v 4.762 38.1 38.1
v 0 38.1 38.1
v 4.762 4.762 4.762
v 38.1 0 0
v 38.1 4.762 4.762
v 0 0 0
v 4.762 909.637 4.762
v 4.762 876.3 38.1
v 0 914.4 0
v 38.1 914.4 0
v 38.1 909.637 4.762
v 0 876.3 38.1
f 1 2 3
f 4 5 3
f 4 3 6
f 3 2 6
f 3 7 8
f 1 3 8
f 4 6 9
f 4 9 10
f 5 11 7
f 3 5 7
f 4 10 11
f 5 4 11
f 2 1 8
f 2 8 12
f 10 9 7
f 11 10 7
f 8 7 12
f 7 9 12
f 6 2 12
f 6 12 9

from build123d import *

# Parameters (mm, degrees)
F1_DEPTH = 914.4
F3_DEPTH = 38.101


with BuildPart() as f1:
    # F0 (on Front) → F1 (new body)
    with BuildSketch(Plane.XZ):
        Polygon((0, 38.1), (0, 0), (38.1, 0), (38.1, 4.7625), (4.7625, 4.7625), (4.7625, 38.1), align=None)
    extrude(amount=-F1_DEPTH)

    # F2 (on face) → F3 (cut, through all)
    with BuildSketch(Plane(origin=(0, 0, 0), x_dir=(0, -1, 0), z_dir=(-1, 0, 0))):
        Polygon((0, 38.1), (-38.1, 38.1), (0, 0), align=None)
        Polygon((-876.3, 38.1), (-914.4, 38.1), (-914.4, 0), align=None)
    extrude(amount=-F3_DEPTH, mode=Mode.SUBTRACT)


solid = f1.part
